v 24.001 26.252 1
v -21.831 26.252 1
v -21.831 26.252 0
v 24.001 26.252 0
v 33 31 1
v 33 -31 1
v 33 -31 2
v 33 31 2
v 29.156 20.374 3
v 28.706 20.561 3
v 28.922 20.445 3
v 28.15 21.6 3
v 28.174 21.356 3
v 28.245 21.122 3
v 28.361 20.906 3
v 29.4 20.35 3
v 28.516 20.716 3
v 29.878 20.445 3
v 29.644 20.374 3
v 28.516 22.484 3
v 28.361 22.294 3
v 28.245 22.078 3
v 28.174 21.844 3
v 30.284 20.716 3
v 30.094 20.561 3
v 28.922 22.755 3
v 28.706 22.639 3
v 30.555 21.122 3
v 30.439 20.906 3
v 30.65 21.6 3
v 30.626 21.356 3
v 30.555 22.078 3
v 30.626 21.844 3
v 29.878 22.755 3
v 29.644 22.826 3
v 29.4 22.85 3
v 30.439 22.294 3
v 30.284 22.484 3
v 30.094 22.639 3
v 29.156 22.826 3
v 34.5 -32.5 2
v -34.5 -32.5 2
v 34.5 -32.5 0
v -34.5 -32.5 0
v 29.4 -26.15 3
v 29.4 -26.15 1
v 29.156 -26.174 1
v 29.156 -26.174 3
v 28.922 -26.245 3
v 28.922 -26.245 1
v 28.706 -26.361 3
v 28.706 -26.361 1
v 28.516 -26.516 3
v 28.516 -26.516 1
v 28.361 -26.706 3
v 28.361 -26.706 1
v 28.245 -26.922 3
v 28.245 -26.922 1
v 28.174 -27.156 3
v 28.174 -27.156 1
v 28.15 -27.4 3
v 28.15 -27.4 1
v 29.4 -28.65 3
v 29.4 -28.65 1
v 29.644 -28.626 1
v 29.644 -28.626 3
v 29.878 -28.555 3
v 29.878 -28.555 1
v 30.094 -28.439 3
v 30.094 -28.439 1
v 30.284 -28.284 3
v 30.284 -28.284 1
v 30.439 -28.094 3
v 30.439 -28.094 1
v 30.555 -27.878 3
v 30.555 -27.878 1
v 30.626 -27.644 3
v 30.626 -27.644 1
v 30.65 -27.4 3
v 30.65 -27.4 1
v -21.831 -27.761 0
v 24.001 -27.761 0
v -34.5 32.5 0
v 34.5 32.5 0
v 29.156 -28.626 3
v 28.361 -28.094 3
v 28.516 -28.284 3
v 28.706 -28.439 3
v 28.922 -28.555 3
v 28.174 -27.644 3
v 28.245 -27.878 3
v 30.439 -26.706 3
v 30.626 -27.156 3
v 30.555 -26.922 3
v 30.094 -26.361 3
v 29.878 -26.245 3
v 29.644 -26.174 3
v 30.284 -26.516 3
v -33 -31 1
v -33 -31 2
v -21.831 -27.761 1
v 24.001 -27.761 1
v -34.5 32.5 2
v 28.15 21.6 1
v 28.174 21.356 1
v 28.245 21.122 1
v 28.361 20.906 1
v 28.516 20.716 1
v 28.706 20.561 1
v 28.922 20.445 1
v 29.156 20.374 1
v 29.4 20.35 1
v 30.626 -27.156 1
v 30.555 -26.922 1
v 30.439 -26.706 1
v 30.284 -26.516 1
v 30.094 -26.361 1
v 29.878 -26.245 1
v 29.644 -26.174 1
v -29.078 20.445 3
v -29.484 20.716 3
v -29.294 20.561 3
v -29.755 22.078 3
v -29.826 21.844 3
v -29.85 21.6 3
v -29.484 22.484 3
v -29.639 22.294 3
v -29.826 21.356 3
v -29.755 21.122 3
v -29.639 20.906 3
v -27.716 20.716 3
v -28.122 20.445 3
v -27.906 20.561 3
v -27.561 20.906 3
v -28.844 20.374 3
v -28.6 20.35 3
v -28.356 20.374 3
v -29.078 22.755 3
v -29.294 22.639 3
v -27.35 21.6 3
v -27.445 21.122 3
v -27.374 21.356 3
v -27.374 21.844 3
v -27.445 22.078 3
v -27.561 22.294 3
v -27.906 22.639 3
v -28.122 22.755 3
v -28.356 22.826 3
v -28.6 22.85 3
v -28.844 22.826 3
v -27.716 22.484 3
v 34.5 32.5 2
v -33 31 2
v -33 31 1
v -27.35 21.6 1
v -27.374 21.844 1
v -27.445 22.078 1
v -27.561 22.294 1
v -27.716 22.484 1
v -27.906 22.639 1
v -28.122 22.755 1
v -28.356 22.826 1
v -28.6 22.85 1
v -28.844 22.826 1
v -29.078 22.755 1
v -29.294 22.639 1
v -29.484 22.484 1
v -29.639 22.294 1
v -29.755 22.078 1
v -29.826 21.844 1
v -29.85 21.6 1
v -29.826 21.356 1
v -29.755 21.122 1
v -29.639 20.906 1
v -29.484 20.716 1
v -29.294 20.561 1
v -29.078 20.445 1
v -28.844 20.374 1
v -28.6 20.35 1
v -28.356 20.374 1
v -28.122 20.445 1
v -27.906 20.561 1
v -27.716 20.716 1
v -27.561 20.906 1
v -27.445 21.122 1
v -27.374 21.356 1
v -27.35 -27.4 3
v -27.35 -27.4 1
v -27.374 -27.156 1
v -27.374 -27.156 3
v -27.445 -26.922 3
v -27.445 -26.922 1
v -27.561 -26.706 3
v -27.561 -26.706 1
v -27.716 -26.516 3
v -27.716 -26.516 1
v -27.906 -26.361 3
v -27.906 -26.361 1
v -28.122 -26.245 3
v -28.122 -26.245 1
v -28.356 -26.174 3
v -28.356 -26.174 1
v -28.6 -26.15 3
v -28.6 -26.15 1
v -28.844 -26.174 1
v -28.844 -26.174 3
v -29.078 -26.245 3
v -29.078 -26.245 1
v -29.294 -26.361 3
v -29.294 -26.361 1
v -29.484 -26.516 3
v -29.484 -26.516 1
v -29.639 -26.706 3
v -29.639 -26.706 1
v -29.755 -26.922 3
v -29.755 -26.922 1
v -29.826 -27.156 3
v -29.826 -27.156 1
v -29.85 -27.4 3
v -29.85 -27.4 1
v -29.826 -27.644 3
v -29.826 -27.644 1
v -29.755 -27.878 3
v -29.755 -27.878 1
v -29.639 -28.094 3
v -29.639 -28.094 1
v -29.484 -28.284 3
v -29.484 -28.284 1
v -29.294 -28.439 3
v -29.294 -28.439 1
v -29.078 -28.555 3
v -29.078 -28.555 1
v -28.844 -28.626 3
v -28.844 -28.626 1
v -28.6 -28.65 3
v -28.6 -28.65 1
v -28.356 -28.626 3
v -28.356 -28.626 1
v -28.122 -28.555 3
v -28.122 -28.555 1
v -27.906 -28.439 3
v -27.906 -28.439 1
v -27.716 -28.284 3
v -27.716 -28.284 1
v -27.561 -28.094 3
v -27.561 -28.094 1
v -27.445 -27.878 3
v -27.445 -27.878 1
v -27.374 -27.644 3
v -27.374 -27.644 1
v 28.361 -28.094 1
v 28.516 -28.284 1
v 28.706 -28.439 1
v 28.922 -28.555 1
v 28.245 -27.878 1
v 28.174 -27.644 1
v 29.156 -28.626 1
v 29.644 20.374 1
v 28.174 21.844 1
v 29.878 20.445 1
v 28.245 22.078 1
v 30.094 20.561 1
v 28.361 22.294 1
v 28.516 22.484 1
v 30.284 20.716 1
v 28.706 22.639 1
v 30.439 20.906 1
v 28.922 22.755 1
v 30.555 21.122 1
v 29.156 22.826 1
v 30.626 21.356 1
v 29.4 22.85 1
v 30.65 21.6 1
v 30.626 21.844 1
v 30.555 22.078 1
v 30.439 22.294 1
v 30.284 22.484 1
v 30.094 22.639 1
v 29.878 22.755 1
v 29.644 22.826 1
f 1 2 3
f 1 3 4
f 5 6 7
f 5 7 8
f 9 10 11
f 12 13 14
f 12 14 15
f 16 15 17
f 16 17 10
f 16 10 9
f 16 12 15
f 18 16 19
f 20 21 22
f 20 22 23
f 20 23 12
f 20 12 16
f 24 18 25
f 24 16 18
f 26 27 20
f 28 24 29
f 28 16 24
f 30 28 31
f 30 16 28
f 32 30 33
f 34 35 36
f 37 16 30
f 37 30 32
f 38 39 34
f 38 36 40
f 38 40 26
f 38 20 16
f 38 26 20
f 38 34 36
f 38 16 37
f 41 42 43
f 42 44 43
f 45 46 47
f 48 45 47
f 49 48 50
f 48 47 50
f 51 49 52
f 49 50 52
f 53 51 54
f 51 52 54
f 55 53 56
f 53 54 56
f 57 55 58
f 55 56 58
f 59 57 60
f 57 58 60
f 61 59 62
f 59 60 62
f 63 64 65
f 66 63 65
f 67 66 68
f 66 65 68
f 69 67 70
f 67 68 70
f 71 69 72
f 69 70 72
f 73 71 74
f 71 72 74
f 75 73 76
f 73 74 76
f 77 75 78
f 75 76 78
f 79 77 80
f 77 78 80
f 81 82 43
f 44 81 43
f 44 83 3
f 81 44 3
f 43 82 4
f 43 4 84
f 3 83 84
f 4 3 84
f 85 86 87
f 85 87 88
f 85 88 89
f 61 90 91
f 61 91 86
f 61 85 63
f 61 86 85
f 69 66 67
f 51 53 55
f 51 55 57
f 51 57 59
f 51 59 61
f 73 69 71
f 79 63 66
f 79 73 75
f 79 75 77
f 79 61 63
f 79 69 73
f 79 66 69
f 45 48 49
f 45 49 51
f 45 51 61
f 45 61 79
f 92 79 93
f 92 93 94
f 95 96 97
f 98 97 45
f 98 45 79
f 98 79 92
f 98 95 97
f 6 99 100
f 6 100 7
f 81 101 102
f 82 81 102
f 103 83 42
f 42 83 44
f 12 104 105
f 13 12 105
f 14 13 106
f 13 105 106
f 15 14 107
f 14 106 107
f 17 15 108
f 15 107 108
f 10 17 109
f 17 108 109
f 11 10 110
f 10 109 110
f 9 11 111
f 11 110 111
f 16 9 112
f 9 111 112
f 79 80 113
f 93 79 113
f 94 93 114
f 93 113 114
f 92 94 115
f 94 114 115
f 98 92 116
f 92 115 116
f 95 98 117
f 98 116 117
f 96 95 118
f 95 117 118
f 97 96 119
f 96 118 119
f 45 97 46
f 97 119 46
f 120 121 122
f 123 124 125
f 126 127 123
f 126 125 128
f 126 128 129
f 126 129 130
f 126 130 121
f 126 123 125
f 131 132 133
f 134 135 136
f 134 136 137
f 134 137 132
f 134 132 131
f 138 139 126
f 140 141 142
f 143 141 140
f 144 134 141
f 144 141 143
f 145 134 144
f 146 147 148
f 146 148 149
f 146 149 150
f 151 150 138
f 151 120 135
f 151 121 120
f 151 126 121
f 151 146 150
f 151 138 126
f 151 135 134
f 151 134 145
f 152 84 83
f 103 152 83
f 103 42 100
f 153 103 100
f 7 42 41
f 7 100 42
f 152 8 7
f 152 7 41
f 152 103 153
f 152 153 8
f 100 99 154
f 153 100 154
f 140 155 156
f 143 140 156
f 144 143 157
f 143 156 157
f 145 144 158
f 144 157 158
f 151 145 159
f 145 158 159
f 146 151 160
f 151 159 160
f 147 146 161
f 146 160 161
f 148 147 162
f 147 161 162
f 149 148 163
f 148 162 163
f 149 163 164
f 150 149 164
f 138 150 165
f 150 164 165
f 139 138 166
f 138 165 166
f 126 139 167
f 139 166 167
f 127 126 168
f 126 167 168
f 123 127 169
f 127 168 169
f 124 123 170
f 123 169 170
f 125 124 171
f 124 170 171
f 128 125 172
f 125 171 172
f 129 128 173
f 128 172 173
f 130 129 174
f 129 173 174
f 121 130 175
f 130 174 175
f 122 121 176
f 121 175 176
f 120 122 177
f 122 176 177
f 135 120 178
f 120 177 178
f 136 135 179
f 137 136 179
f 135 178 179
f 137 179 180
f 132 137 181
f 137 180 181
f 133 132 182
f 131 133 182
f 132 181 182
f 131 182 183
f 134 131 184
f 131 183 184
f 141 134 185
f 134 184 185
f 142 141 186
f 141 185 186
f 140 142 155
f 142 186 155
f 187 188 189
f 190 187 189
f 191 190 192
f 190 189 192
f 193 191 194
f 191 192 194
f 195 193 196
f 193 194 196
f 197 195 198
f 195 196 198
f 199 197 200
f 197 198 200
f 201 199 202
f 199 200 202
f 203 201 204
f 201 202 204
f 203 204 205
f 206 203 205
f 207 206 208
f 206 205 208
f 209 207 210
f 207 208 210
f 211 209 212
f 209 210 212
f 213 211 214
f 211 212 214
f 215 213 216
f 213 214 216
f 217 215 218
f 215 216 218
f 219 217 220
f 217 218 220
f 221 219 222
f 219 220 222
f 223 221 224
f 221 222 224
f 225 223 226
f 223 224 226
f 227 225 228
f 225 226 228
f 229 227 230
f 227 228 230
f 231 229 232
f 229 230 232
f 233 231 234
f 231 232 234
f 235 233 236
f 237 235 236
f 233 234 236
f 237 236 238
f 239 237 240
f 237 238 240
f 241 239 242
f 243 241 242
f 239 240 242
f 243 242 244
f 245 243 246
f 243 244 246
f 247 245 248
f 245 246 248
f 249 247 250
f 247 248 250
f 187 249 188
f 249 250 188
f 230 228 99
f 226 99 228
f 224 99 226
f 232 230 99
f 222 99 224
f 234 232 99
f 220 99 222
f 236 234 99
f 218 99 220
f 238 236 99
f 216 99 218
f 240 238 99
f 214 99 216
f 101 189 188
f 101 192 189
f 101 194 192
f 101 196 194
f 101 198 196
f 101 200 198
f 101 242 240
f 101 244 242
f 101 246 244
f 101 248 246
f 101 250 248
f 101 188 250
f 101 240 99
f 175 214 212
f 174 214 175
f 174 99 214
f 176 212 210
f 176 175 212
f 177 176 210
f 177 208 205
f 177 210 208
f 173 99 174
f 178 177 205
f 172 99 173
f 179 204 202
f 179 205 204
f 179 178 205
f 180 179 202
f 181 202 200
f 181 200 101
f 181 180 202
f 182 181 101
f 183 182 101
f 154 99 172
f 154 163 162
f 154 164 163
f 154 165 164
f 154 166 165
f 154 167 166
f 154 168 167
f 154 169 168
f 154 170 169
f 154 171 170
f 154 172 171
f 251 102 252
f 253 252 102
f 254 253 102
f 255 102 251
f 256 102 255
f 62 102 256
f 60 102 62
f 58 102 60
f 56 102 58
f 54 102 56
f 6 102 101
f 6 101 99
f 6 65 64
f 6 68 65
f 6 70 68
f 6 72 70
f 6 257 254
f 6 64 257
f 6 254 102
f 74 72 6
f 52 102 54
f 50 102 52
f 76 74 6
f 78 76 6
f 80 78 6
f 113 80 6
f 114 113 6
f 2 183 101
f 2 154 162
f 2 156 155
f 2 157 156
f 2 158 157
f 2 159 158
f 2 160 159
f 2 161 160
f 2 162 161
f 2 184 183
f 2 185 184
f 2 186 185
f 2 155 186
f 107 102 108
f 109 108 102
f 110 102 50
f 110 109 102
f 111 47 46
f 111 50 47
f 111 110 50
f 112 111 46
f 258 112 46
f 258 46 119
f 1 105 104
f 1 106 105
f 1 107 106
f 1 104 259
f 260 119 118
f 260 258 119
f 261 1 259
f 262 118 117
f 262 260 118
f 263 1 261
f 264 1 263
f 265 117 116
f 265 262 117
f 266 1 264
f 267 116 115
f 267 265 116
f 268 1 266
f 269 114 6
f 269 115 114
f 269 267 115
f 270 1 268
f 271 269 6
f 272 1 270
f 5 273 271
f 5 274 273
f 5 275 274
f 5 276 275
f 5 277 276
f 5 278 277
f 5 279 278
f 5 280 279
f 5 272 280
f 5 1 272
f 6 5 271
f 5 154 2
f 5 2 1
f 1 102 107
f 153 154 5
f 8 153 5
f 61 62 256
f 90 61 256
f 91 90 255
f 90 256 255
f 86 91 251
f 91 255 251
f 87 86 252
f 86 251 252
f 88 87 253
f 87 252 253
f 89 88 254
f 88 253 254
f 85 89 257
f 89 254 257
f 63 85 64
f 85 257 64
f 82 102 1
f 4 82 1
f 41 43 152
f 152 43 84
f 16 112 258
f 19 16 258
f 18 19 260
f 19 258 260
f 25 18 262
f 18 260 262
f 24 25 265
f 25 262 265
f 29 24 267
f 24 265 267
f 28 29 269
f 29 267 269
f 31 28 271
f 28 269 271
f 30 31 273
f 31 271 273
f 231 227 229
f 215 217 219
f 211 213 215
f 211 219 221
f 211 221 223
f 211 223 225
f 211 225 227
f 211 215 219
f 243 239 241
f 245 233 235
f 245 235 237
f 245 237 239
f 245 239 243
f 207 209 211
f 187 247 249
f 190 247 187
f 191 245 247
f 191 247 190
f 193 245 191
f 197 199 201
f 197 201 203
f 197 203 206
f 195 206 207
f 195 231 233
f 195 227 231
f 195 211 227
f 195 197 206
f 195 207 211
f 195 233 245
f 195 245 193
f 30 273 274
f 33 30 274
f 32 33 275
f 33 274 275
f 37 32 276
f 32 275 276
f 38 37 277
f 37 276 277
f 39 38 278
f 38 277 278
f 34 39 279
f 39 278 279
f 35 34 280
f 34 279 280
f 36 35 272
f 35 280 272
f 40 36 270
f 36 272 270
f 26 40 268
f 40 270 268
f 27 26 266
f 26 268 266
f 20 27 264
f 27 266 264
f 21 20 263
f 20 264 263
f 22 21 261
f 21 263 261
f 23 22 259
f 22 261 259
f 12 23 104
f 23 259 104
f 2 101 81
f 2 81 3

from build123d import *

# Parameters (mm, degrees)
F0_W     = 69
F0_H     = 65
F1_DEPTH = 1
F2_W     = 66
F2_H     = 62
F3_DEPTH = 1
F4_R     = 1.25
F5_DEPTH = 2
F6_W     = 45.8320826292
F6_H     = 54.0132429451
F7_DEPTH = 25


with BuildPart() as f1:
    # F0 (on Top) → F1 (new body)
    with BuildSketch(Plane.XY):
        Rectangle(F0_W, F0_H)
    extrude(amount=F1_DEPTH)

    # F2 (on face) → F3 (join)
    with BuildSketch(Plane.XY.offset(1)):
        Polygon((-33, 32.5), (-34.5, 32.5), (-34.5, 31), (-34.5, -31), (-34.5, -32.5), (-33, -32.5), (33, -32.5), (34.5, -32.5), (34.5, -31), (34.5, 31), (34.5, 32.5), (33, 32.5), align=None)
        Rectangle(F2_W, F2_H, mode=Mode.SUBTRACT)
    extrude(amount=F3_DEPTH)

    # F4 (on face) → F5 (join)
    with BuildSketch(Plane.XY.offset(1)):
        with Locations((-28.6, 21.6)):
            Circle(F4_R)
        with BuildLine():
            Line((29.4, 21.6), (29.4, 20.35))
            ThreePointArc((29.4, 20.35), (30.2838834765, 20.7161165235), (30.65, 21.6))
            ThreePointArc((30.65, 21.6), (29.4, 22.85), (28.15, 21.6))
            Line((28.15, 21.6), (29.4, 21.6))
        make_face()
        with BuildLine():
            ThreePointArc((28.15, 21.6), (28.5161165235, 20.7161165235), (29.4, 20.35))
            Line((29.4, 20.35), (29.4, 21.6))
            Line((29.4, 21.6), (28.15, 21.6))
        make_face()
        with BuildLine():
            Line((28.15, -27.4), (29.4, -27.4))
            Line((29.4, -27.4), (29.4, -26.15))
            ThreePointArc((29.4, -26.15), (28.5161165235, -26.5161165235), (28.15, -27.4))
        make_face()
        with BuildLine():
            ThreePointArc((28.15, -27.4), (28.5161165235, -28.2838834765), (29.4, -28.65))
            Line((29.4, -28.65), (29.4, -27.4))
            Line((29.4, -27.4), (28.15, -27.4))
        make_face()
        with BuildLine():
            Line((29.4, -27.4), (29.4, -28.65))
            ThreePointArc((29.4, -28.65), (30.2838834765, -28.2838834765), (30.65, -27.4))
            ThreePointArc((30.65, -27.4), (30.2838834765, -26.5161165235), (29.4, -26.15))
            Line((29.4, -26.15), (29.4, -27.4))
        make_face()
        with Locations((-28.6, -27.4)):
            Circle(F4_R)
    extrude(amount=F5_DEPTH)

    # F6 (on face) → F7 (cut)
    with BuildSketch(Plane.XY.offset(1)):
        with Locations((1.0845791548, -0.7542716339)):
            Rectangle(F6_W, F6_H)
    extrude(amount=-F7_DEPTH, mode=Mode.SUBTRACT)


solid = f1.part
